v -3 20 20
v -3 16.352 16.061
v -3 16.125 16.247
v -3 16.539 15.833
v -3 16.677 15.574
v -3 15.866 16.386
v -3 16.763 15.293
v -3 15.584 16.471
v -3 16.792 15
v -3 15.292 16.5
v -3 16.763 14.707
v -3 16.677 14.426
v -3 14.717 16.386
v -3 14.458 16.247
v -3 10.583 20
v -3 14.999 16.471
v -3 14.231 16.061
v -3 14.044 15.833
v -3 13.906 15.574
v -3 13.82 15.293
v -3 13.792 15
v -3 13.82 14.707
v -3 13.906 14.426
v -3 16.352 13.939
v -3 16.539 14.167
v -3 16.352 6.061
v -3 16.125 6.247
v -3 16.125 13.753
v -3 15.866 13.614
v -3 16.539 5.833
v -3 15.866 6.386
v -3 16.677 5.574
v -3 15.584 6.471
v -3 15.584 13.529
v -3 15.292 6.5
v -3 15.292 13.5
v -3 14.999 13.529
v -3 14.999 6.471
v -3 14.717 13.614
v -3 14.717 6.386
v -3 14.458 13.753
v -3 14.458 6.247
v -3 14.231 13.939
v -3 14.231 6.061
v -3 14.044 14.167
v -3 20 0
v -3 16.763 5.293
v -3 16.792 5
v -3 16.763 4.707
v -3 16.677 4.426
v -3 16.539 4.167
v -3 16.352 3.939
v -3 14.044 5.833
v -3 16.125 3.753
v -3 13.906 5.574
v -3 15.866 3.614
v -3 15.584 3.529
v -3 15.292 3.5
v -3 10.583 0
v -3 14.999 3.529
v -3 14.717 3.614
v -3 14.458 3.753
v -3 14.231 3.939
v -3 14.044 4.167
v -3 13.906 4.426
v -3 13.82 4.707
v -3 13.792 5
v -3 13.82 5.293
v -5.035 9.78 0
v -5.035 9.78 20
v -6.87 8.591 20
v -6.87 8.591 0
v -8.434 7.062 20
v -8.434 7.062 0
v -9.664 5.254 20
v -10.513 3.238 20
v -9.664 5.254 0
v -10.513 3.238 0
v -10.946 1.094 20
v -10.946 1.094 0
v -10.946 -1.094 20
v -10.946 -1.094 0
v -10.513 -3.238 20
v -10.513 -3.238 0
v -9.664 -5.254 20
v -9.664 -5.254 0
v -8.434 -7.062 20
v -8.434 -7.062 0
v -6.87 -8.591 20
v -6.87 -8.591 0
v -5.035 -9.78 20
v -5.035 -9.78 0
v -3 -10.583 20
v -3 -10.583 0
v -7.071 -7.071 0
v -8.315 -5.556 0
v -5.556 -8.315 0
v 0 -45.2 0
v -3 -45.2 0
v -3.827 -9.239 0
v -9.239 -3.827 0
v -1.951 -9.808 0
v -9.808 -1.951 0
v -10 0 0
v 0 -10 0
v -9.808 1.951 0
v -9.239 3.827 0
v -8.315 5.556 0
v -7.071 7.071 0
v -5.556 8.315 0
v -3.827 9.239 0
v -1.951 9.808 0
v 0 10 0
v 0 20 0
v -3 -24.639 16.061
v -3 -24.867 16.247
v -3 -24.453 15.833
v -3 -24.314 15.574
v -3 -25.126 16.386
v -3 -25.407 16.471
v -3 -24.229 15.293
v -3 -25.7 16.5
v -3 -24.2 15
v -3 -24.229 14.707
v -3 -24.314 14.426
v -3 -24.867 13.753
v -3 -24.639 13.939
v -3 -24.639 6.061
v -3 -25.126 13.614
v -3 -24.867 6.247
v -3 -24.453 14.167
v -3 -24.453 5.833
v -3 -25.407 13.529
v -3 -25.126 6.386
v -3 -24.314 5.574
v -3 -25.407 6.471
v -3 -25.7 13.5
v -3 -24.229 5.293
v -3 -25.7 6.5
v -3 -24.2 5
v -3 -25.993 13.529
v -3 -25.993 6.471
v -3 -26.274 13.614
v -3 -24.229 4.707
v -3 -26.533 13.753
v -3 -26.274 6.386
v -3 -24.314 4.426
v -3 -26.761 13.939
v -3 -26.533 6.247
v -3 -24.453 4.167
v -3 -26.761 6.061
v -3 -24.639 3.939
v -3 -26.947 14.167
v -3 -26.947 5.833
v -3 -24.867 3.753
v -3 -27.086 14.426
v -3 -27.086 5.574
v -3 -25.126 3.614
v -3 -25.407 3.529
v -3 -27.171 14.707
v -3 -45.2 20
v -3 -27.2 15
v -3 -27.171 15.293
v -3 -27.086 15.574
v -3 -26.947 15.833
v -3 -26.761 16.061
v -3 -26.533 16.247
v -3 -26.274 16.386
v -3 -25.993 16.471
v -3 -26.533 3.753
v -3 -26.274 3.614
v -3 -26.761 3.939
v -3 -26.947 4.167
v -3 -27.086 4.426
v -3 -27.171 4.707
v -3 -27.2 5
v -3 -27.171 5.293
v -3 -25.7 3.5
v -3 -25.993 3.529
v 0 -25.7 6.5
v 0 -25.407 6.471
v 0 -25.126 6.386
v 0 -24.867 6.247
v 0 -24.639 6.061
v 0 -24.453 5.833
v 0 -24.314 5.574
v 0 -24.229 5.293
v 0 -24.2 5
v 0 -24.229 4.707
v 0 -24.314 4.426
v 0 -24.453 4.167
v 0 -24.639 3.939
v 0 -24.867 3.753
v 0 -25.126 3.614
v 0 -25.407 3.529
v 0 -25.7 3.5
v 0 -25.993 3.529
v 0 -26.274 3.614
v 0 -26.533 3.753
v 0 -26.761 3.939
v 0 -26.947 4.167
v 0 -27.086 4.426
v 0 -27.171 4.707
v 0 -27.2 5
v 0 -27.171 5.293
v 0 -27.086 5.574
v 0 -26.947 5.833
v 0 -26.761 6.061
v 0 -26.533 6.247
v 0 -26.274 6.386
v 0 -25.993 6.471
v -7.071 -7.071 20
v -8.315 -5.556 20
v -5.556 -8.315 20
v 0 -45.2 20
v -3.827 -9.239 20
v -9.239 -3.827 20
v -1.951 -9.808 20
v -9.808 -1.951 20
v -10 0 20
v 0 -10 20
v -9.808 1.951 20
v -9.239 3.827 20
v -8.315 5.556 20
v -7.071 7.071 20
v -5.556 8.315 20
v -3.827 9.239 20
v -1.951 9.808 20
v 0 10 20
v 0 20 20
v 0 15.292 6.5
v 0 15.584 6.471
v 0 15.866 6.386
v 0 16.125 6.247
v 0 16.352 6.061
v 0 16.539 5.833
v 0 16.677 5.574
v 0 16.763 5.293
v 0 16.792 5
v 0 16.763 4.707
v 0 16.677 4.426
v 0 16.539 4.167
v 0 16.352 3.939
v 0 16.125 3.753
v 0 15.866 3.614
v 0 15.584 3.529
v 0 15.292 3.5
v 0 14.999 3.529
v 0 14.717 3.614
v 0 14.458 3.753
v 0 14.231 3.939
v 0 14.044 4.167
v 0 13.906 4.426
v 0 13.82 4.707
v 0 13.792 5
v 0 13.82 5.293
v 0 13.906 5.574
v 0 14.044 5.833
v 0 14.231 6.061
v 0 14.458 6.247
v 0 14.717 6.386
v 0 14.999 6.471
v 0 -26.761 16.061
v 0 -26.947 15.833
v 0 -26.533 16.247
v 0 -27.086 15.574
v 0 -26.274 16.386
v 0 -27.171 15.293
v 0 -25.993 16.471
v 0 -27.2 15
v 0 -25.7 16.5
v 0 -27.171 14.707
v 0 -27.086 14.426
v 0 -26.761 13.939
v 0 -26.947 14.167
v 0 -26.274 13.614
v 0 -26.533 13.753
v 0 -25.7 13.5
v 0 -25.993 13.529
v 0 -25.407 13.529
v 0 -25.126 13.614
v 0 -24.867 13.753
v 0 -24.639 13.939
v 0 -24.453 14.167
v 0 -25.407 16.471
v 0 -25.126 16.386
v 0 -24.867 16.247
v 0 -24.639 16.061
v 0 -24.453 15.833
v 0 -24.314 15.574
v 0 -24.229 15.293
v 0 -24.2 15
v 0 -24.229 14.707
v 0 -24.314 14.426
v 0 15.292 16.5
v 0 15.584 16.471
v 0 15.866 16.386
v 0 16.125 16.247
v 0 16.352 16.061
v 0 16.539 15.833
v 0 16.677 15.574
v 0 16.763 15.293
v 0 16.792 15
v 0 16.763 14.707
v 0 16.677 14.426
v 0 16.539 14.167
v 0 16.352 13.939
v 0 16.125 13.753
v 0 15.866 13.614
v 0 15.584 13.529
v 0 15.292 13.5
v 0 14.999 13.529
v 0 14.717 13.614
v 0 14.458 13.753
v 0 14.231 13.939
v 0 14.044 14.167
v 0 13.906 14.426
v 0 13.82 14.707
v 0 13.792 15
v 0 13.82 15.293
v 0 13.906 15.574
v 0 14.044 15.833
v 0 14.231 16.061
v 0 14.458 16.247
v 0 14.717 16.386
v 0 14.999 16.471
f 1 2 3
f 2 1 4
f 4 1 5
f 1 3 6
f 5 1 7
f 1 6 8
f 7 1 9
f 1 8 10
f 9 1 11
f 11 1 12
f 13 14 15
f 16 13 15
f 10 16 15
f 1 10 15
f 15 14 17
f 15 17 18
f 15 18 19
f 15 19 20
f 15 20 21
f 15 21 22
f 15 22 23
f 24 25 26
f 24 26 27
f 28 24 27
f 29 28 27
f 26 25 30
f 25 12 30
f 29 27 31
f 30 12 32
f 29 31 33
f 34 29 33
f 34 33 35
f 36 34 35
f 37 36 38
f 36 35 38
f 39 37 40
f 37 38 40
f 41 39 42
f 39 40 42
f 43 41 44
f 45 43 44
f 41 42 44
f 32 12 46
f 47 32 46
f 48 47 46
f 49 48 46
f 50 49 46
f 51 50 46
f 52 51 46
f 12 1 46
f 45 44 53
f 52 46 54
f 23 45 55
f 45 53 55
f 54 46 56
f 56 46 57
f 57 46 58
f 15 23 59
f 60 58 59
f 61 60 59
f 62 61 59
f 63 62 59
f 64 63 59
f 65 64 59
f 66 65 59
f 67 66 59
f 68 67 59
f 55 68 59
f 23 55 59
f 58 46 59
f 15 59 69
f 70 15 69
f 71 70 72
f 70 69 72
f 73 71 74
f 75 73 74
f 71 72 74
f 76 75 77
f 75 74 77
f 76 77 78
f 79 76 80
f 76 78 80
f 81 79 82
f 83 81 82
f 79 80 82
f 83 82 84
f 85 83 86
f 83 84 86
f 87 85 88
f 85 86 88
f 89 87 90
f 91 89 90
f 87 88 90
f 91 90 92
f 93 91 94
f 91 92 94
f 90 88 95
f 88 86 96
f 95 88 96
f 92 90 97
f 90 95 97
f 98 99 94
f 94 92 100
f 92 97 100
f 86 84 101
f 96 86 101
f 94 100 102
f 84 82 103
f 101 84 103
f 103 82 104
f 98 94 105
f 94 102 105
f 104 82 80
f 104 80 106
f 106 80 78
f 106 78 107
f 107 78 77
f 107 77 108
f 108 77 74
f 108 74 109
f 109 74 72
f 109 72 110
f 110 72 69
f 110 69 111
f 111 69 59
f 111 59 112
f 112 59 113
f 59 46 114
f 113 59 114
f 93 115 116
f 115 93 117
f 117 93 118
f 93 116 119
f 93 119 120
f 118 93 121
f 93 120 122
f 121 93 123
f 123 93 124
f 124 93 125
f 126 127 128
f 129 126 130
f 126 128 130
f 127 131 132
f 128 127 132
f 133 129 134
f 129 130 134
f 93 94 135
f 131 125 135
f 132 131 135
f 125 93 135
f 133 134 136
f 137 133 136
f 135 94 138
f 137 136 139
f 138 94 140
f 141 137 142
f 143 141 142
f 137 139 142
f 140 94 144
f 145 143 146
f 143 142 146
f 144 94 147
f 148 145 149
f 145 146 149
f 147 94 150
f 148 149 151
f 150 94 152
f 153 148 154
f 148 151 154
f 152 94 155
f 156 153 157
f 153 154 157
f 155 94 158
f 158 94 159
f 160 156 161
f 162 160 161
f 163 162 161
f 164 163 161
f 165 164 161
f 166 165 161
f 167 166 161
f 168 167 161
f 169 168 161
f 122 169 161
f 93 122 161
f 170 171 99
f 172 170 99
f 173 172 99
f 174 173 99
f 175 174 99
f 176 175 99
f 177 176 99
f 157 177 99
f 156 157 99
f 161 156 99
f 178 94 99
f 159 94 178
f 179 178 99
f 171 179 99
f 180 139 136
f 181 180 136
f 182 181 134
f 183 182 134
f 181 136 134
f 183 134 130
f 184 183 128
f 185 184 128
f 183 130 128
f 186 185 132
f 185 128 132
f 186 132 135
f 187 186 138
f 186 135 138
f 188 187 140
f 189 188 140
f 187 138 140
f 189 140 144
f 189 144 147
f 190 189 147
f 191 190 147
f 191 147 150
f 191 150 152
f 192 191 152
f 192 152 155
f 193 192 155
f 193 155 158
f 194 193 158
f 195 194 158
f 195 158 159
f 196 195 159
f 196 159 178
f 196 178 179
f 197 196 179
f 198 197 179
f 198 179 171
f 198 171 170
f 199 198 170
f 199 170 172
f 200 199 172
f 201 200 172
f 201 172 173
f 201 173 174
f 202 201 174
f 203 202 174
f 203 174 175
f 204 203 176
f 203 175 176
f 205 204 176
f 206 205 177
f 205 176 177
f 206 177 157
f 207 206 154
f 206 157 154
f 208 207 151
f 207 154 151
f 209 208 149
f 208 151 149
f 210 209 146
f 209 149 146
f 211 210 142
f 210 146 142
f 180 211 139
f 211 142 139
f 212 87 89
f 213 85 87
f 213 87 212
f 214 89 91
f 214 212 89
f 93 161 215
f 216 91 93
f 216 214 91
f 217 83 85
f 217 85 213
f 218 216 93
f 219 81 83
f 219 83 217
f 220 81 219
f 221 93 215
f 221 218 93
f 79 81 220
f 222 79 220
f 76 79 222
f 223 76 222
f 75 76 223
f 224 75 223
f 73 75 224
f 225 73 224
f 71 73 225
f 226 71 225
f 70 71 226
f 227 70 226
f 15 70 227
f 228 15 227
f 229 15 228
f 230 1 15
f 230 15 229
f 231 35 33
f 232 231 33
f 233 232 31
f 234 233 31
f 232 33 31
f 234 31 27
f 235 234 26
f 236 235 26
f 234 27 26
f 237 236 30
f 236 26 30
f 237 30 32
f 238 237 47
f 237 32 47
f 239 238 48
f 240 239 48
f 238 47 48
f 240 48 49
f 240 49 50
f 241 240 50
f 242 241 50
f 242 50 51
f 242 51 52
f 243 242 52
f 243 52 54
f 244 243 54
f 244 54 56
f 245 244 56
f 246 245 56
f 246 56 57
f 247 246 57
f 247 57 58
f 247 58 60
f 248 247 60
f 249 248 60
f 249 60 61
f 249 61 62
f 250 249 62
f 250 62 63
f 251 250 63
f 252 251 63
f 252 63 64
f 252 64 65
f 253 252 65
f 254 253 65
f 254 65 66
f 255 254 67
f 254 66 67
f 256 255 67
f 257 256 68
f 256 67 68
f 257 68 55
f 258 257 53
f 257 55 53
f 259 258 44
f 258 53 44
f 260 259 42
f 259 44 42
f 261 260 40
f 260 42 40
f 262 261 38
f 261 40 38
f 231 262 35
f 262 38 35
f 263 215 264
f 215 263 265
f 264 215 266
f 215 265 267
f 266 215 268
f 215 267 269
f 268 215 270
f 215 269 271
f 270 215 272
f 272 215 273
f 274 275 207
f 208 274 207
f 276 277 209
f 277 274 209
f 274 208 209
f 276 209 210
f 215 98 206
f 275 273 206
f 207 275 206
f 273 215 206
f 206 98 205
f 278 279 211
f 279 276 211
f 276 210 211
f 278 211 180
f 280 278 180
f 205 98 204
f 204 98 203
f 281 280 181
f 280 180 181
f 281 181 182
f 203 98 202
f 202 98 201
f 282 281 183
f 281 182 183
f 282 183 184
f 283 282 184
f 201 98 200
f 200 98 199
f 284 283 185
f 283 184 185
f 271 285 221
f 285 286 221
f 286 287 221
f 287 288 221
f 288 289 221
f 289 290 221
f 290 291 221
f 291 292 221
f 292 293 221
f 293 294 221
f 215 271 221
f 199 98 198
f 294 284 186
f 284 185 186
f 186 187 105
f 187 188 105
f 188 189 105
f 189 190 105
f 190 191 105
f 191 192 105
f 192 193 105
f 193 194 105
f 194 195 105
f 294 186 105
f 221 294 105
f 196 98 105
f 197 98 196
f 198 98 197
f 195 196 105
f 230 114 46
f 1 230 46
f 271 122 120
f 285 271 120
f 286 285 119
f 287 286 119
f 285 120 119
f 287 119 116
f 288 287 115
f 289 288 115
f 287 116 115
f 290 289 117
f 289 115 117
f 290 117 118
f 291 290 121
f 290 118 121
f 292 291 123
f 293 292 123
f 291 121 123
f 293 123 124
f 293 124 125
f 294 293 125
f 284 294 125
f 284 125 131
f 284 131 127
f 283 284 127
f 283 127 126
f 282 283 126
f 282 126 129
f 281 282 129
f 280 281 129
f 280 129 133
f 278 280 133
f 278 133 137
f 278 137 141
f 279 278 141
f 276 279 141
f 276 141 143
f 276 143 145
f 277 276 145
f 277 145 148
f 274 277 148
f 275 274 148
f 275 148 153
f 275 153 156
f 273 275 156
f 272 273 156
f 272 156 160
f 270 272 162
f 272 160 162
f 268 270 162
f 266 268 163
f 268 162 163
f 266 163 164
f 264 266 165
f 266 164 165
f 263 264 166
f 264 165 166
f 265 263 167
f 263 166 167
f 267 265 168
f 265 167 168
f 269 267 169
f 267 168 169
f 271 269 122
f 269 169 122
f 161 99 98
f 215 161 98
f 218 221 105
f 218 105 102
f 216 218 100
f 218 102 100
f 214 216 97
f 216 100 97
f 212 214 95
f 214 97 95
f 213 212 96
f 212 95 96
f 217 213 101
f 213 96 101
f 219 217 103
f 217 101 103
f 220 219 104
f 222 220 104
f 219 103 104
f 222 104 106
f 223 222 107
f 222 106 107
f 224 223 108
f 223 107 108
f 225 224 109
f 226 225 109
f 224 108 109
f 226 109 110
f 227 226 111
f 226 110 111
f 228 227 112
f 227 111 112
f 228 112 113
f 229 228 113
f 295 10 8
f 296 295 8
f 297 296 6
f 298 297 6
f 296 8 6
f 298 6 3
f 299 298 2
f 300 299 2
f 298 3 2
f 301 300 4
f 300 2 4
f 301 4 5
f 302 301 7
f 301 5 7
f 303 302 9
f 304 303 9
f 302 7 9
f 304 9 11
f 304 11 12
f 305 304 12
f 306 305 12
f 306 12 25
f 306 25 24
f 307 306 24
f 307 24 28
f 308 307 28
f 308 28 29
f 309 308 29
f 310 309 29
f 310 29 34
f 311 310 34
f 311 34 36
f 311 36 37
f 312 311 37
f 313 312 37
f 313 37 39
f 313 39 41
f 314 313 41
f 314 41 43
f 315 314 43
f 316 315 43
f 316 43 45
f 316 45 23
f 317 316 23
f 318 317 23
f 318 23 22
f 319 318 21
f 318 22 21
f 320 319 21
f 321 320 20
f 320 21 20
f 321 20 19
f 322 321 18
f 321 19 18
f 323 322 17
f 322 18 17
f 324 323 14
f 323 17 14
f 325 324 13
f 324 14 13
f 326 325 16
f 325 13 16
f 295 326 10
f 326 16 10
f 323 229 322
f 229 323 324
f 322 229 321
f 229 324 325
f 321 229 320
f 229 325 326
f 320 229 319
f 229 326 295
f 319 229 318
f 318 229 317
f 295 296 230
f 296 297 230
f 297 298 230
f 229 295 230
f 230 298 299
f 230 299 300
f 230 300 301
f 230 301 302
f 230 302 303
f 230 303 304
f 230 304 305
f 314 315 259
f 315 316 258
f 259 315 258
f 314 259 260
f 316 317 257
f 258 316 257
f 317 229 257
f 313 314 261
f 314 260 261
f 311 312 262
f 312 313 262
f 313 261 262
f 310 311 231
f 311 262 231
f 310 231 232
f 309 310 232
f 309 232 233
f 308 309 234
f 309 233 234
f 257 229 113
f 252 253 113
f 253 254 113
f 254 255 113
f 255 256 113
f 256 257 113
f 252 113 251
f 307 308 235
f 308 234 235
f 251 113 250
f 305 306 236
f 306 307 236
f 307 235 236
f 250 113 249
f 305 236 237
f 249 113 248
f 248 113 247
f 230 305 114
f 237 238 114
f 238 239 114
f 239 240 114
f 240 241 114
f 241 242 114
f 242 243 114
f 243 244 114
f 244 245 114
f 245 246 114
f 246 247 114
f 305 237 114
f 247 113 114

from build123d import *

# Parameters (mm, degrees)
EXTRUDE_1_DEPTH     = 20
SKETCH_2_R          = 1.5
CUT_EXTRUDE_1_DEPTH = 20


with BuildPart() as part:
    # 草图1 → 凸台-拉伸1 (new body)
    with BuildSketch(Plane.XY):
        with BuildLine():
            Line((-3, 20), (-3, 10.583005244))
            ThreePointArc((-3, 10.583005244), (-11, 0), (-3, -10.583005244))
            Line((-3, -10.583005244), (-3, -45.2))
            Line((-3, -45.2), (0, -45.2))
            Line((0, -45.2), (0, -10))
            ThreePointArc((0, -10), (-10, 0), (0, 10))
            Line((0, 10), (0, 20))
            Line((0, 20), (-3, 20))
        make_face()
    extrude(amount=EXTRUDE_1_DEPTH)

    # 草图2 → 切除-拉伸1 (cut)
    with BuildSketch(Plane.ZY.offset(3)):
        with Locations((5, 15.291502622)):
            Circle(SKETCH_2_R)
        with Locations((15, 15.291502622)):
            Circle(SKETCH_2_R)
        with Locations((5, -25.7)):
            Circle(SKETCH_2_R)
        with Locations((15, -25.7)):
            Circle(SKETCH_2_R)
    extrude(amount=-CUT_EXTRUDE_1_DEPTH, mode=Mode.SUBTRACT)


solid = part.part
